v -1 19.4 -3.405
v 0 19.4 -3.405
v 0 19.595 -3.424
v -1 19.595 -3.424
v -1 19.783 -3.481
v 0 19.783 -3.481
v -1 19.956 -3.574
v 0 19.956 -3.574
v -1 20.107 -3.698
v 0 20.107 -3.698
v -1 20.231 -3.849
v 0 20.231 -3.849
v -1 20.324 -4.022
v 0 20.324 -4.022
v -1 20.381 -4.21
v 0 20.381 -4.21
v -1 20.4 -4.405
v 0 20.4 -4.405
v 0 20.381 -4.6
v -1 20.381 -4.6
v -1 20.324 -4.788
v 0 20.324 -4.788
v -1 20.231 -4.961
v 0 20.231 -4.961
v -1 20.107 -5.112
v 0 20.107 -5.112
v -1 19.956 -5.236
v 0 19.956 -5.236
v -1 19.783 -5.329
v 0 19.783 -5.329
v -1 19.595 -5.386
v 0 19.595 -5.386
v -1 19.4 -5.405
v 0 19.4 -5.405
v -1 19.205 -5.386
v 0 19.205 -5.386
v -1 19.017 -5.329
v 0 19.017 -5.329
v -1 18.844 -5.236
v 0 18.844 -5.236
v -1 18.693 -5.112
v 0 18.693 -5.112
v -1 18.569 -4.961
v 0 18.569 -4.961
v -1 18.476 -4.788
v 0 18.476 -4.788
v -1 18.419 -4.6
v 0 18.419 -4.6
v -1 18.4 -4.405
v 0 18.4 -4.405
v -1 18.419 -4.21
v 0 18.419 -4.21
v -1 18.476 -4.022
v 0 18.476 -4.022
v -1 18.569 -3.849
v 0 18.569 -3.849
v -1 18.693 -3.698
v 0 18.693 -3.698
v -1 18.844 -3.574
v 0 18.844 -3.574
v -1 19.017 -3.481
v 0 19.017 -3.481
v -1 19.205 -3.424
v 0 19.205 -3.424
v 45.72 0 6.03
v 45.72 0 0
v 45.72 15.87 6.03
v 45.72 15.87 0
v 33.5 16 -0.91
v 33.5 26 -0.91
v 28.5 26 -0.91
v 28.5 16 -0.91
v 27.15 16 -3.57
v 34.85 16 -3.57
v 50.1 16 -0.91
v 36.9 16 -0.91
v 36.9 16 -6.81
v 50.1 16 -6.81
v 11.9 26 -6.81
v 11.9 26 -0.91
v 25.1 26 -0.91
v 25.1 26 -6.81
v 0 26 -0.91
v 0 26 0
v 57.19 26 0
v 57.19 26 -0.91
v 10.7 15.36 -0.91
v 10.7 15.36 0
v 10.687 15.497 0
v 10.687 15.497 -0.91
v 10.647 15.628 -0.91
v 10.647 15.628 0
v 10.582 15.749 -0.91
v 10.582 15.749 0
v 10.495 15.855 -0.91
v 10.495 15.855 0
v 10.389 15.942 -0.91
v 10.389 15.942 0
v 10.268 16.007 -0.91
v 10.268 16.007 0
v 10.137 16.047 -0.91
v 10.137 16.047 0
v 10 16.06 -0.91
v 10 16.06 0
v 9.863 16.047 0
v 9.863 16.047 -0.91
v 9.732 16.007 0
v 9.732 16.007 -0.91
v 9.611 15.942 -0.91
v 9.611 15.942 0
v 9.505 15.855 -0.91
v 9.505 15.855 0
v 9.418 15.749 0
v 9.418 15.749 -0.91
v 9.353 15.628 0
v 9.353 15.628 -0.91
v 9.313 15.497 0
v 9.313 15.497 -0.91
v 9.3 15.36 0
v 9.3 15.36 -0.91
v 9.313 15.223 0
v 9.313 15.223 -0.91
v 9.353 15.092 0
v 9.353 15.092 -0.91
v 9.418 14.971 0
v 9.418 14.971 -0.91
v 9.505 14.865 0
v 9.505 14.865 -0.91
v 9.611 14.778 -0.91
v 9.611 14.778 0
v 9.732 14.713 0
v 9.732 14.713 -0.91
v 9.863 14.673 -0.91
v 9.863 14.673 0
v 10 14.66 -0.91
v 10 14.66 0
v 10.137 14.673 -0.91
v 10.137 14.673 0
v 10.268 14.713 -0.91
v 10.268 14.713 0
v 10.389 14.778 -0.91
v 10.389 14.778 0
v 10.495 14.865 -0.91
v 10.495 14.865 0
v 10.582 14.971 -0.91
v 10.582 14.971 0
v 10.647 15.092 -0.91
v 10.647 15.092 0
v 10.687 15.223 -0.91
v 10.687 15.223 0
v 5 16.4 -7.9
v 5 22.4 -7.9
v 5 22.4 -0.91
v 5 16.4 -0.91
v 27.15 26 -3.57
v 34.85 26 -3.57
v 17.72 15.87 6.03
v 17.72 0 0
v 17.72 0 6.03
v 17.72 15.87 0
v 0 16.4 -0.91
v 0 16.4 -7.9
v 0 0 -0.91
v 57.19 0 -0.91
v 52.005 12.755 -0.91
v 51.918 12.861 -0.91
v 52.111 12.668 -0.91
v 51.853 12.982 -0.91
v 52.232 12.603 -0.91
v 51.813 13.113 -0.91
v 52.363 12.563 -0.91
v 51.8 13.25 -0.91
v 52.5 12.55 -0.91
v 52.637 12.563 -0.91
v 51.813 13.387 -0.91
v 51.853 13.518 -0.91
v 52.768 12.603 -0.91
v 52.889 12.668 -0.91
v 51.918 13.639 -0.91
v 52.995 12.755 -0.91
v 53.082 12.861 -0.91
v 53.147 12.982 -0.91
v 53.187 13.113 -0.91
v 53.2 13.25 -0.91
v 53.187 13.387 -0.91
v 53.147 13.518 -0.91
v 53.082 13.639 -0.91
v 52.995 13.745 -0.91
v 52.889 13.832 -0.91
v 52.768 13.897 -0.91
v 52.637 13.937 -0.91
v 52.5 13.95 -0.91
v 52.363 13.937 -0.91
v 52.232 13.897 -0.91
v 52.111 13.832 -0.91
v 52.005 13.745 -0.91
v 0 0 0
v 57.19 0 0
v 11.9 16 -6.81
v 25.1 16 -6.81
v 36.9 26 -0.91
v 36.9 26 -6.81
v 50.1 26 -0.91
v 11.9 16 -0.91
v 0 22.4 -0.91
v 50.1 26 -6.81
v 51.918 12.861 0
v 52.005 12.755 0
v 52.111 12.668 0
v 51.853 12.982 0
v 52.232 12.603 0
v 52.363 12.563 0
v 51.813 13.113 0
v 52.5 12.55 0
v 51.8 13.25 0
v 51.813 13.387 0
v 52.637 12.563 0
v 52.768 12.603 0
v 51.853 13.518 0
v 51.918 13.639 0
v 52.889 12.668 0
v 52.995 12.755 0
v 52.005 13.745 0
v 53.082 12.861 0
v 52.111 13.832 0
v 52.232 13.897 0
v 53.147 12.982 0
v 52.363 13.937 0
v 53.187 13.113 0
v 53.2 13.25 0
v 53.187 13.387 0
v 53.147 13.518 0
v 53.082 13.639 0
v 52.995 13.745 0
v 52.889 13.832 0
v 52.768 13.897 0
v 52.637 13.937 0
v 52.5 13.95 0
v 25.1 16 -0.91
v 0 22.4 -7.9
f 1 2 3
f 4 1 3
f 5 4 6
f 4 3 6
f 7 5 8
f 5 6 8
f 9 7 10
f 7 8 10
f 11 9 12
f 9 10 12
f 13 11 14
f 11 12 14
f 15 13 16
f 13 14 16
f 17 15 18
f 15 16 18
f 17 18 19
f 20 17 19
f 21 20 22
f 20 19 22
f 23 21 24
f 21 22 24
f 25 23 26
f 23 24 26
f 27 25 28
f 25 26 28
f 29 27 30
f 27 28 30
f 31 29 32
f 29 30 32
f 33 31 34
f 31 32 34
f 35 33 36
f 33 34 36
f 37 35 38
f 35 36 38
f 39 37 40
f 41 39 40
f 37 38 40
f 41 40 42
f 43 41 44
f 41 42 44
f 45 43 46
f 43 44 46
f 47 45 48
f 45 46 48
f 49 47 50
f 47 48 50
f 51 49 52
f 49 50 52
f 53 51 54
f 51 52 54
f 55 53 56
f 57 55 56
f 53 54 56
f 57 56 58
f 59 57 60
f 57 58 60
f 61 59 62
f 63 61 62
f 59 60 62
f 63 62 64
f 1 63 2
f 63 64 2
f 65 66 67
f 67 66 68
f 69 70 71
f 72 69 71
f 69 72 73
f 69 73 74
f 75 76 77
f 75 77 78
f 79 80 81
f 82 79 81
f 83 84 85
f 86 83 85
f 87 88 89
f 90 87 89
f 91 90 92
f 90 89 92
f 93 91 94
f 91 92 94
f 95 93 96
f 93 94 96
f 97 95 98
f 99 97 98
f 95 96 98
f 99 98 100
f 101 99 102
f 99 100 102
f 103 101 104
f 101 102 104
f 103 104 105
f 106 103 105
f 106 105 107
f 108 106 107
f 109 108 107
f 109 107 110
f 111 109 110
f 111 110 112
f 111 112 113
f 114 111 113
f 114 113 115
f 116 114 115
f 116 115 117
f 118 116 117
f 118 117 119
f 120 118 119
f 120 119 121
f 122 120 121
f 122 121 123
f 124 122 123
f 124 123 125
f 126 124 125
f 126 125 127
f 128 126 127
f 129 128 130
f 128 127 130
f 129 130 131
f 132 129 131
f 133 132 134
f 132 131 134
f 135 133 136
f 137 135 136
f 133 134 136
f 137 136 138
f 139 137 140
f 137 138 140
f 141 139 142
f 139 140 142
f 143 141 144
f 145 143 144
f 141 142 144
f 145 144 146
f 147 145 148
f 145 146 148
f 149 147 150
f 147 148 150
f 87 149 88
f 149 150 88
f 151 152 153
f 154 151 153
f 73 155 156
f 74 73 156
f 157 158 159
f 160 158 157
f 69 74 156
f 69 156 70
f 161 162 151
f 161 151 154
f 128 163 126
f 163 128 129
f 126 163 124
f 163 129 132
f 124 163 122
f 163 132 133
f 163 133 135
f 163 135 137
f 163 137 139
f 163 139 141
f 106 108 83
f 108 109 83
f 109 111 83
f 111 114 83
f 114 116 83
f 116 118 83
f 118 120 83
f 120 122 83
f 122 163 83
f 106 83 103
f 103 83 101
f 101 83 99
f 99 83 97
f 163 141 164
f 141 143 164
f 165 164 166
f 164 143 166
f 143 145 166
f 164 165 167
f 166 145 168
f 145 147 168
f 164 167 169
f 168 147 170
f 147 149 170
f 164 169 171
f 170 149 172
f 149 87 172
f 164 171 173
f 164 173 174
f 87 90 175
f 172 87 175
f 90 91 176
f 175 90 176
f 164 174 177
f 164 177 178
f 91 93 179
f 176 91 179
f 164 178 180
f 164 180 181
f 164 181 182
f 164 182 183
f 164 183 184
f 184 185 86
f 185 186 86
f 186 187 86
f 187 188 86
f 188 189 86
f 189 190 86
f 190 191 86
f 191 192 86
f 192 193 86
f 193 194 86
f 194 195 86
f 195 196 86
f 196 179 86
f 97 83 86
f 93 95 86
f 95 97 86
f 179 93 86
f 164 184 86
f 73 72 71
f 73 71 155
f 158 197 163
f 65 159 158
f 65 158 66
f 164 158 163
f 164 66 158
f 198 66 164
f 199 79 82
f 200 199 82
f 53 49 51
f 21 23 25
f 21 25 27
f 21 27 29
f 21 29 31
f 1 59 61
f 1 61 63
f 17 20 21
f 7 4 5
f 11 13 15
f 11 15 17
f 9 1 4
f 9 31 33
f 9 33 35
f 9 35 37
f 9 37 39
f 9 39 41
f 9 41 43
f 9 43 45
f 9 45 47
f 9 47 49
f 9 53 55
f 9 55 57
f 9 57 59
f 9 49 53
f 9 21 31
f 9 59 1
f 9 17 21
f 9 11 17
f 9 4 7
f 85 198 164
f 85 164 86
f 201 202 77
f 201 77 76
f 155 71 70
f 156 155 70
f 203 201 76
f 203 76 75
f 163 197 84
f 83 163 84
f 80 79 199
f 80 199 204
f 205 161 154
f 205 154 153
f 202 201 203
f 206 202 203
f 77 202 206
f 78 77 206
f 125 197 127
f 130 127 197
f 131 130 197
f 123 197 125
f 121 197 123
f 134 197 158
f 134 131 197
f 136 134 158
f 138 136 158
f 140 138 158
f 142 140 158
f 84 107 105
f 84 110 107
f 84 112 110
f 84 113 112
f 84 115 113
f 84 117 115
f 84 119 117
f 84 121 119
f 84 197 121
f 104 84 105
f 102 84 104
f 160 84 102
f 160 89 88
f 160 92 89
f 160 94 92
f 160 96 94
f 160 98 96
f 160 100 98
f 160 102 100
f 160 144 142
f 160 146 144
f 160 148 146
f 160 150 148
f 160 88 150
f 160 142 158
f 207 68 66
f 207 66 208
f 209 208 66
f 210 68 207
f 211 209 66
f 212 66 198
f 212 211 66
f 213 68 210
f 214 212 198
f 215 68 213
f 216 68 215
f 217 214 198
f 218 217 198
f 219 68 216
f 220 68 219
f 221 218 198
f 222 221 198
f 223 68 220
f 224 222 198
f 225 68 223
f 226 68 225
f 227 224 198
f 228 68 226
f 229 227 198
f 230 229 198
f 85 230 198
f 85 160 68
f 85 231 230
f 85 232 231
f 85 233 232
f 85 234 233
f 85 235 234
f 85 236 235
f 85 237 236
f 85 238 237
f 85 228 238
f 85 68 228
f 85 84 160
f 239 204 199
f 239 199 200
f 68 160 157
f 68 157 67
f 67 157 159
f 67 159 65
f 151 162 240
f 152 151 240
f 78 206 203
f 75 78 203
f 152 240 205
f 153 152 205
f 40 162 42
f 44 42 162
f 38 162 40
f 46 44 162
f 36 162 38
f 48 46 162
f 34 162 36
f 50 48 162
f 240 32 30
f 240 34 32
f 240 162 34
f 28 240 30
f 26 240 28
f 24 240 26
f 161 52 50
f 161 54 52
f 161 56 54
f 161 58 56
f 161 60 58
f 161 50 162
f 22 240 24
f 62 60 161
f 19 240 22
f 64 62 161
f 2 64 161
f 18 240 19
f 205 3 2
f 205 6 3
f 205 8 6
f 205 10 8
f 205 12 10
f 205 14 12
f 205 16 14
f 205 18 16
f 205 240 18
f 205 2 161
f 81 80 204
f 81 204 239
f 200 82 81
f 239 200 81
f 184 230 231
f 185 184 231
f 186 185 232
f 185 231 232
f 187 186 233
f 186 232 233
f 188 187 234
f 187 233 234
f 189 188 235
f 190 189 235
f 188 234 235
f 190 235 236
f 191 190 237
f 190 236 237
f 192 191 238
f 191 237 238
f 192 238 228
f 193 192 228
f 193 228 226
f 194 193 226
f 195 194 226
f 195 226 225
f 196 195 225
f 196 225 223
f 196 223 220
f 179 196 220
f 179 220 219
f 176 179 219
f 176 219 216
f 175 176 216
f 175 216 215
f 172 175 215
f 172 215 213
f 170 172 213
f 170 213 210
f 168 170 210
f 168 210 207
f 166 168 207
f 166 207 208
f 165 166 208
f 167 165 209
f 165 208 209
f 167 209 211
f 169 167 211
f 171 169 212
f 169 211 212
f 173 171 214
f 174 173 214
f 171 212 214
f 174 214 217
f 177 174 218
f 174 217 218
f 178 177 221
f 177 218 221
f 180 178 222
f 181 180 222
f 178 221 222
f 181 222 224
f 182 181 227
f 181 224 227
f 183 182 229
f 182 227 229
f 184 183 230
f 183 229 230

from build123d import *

# Parameters (mm, degrees)
SKETCH_1_W          = 57.19
SKETCH_1_H          = 26
EXTRUDE_1_DEPTH     = 0.91
SKETCH_2_W          = 28
SKETCH_2_H          = 15.87
EXTRUDE_2_DEPTH     = 6.03
SKETCH_3_R          = 0.7
CUT_EXTRUDE_1_DEPTH = 3
SKETCH_4_W          = 13.2
SKETCH_4_H          = 5.9
EXTRUDE_3_DEPTH     = 10
EXTRUDE_3_2_DEPTH   = 10
EXTRUDE_3_3_DEPTH   = 10
SKETCH_5_W          = 6.99
SKETCH_5_H          = 6
EXTRUDE_4_DEPTH     = 5
SKETCH_6_R          = 1
EXTRUDE_5_DEPTH     = 1


with BuildPart() as part:
    # Эскиз1 → Бобышка-Вытянуть1 (new body)
    with BuildSketch(Plane.XY):
        with Locations((28.595, 13)):
            Rectangle(SKETCH_1_W, SKETCH_1_H)
    extrude(amount=-EXTRUDE_1_DEPTH)

    # Эскиз2 → Бобышка-Вытянуть2 (add)
    with BuildSketch(Plane.XY):
        with Locations((31.72, 7.935)):
            Rectangle(SKETCH_2_W, SKETCH_2_H)
    extrude(amount=EXTRUDE_2_DEPTH)

    # Эскиз3 → Вырез-Вытянуть1 (cut)
    with BuildSketch(Plane.XY):
        with Locations((10, 15.36)):
            Circle(SKETCH_3_R)
        with Locations((52.5, 13.25)):
            Circle(SKETCH_3_R)
    extrude(amount=-CUT_EXTRUDE_1_DEPTH, mode=Mode.SUBTRACT)


with BuildPart() as body_2:
    # Эскиз4 → Бобышка-Вытянуть3 (new body)
    with BuildSketch(Plane.XZ.offset(-26)):
        with Locations((18.5, -3.86)):
            Rectangle(SKETCH_4_W, SKETCH_4_H)
    extrude(amount=EXTRUDE_3_DEPTH)


with BuildPart() as body_3:
    # Эскиз4 → Extrude 3 2 (new body)
    with BuildSketch(Plane.XZ.offset(-26)):
        with Locations((43.5, -3.86)):
            Rectangle(SKETCH_4_W, SKETCH_4_H)
    extrude(amount=EXTRUDE_3_2_DEPTH)


with BuildPart() as body_4:
    # Эскиз4 → Extrude 3 3 (new body)
    with BuildSketch(Plane.XZ.offset(-26)):
        Polygon((33.5, -0.91), (28.5, -0.91), (27.15, -3.57), (34.85, -3.57), align=None)
    extrude(amount=EXTRUDE_3_3_DEPTH)


with BuildPart() as body_5:
    # Эскиз5 → Бобышка-Вытянуть4 (new body)
    with BuildSketch(Plane.ZY):
        with Locations((-4.405, 19.4)):
            Rectangle(SKETCH_5_W, SKETCH_5_H)
    extrude(amount=-EXTRUDE_4_DEPTH)

    # Эскиз6 → Бобышка-Вытянуть5 (add)
    with BuildSketch(Plane.ZY):
        with Locations((-4.405, 19.4)):
            Circle(SKETCH_6_R)
    extrude(amount=EXTRUDE_5_DEPTH)


solid = Compound([part.part, body_2.part, body_3.part, body_4.part, body_5.part])
